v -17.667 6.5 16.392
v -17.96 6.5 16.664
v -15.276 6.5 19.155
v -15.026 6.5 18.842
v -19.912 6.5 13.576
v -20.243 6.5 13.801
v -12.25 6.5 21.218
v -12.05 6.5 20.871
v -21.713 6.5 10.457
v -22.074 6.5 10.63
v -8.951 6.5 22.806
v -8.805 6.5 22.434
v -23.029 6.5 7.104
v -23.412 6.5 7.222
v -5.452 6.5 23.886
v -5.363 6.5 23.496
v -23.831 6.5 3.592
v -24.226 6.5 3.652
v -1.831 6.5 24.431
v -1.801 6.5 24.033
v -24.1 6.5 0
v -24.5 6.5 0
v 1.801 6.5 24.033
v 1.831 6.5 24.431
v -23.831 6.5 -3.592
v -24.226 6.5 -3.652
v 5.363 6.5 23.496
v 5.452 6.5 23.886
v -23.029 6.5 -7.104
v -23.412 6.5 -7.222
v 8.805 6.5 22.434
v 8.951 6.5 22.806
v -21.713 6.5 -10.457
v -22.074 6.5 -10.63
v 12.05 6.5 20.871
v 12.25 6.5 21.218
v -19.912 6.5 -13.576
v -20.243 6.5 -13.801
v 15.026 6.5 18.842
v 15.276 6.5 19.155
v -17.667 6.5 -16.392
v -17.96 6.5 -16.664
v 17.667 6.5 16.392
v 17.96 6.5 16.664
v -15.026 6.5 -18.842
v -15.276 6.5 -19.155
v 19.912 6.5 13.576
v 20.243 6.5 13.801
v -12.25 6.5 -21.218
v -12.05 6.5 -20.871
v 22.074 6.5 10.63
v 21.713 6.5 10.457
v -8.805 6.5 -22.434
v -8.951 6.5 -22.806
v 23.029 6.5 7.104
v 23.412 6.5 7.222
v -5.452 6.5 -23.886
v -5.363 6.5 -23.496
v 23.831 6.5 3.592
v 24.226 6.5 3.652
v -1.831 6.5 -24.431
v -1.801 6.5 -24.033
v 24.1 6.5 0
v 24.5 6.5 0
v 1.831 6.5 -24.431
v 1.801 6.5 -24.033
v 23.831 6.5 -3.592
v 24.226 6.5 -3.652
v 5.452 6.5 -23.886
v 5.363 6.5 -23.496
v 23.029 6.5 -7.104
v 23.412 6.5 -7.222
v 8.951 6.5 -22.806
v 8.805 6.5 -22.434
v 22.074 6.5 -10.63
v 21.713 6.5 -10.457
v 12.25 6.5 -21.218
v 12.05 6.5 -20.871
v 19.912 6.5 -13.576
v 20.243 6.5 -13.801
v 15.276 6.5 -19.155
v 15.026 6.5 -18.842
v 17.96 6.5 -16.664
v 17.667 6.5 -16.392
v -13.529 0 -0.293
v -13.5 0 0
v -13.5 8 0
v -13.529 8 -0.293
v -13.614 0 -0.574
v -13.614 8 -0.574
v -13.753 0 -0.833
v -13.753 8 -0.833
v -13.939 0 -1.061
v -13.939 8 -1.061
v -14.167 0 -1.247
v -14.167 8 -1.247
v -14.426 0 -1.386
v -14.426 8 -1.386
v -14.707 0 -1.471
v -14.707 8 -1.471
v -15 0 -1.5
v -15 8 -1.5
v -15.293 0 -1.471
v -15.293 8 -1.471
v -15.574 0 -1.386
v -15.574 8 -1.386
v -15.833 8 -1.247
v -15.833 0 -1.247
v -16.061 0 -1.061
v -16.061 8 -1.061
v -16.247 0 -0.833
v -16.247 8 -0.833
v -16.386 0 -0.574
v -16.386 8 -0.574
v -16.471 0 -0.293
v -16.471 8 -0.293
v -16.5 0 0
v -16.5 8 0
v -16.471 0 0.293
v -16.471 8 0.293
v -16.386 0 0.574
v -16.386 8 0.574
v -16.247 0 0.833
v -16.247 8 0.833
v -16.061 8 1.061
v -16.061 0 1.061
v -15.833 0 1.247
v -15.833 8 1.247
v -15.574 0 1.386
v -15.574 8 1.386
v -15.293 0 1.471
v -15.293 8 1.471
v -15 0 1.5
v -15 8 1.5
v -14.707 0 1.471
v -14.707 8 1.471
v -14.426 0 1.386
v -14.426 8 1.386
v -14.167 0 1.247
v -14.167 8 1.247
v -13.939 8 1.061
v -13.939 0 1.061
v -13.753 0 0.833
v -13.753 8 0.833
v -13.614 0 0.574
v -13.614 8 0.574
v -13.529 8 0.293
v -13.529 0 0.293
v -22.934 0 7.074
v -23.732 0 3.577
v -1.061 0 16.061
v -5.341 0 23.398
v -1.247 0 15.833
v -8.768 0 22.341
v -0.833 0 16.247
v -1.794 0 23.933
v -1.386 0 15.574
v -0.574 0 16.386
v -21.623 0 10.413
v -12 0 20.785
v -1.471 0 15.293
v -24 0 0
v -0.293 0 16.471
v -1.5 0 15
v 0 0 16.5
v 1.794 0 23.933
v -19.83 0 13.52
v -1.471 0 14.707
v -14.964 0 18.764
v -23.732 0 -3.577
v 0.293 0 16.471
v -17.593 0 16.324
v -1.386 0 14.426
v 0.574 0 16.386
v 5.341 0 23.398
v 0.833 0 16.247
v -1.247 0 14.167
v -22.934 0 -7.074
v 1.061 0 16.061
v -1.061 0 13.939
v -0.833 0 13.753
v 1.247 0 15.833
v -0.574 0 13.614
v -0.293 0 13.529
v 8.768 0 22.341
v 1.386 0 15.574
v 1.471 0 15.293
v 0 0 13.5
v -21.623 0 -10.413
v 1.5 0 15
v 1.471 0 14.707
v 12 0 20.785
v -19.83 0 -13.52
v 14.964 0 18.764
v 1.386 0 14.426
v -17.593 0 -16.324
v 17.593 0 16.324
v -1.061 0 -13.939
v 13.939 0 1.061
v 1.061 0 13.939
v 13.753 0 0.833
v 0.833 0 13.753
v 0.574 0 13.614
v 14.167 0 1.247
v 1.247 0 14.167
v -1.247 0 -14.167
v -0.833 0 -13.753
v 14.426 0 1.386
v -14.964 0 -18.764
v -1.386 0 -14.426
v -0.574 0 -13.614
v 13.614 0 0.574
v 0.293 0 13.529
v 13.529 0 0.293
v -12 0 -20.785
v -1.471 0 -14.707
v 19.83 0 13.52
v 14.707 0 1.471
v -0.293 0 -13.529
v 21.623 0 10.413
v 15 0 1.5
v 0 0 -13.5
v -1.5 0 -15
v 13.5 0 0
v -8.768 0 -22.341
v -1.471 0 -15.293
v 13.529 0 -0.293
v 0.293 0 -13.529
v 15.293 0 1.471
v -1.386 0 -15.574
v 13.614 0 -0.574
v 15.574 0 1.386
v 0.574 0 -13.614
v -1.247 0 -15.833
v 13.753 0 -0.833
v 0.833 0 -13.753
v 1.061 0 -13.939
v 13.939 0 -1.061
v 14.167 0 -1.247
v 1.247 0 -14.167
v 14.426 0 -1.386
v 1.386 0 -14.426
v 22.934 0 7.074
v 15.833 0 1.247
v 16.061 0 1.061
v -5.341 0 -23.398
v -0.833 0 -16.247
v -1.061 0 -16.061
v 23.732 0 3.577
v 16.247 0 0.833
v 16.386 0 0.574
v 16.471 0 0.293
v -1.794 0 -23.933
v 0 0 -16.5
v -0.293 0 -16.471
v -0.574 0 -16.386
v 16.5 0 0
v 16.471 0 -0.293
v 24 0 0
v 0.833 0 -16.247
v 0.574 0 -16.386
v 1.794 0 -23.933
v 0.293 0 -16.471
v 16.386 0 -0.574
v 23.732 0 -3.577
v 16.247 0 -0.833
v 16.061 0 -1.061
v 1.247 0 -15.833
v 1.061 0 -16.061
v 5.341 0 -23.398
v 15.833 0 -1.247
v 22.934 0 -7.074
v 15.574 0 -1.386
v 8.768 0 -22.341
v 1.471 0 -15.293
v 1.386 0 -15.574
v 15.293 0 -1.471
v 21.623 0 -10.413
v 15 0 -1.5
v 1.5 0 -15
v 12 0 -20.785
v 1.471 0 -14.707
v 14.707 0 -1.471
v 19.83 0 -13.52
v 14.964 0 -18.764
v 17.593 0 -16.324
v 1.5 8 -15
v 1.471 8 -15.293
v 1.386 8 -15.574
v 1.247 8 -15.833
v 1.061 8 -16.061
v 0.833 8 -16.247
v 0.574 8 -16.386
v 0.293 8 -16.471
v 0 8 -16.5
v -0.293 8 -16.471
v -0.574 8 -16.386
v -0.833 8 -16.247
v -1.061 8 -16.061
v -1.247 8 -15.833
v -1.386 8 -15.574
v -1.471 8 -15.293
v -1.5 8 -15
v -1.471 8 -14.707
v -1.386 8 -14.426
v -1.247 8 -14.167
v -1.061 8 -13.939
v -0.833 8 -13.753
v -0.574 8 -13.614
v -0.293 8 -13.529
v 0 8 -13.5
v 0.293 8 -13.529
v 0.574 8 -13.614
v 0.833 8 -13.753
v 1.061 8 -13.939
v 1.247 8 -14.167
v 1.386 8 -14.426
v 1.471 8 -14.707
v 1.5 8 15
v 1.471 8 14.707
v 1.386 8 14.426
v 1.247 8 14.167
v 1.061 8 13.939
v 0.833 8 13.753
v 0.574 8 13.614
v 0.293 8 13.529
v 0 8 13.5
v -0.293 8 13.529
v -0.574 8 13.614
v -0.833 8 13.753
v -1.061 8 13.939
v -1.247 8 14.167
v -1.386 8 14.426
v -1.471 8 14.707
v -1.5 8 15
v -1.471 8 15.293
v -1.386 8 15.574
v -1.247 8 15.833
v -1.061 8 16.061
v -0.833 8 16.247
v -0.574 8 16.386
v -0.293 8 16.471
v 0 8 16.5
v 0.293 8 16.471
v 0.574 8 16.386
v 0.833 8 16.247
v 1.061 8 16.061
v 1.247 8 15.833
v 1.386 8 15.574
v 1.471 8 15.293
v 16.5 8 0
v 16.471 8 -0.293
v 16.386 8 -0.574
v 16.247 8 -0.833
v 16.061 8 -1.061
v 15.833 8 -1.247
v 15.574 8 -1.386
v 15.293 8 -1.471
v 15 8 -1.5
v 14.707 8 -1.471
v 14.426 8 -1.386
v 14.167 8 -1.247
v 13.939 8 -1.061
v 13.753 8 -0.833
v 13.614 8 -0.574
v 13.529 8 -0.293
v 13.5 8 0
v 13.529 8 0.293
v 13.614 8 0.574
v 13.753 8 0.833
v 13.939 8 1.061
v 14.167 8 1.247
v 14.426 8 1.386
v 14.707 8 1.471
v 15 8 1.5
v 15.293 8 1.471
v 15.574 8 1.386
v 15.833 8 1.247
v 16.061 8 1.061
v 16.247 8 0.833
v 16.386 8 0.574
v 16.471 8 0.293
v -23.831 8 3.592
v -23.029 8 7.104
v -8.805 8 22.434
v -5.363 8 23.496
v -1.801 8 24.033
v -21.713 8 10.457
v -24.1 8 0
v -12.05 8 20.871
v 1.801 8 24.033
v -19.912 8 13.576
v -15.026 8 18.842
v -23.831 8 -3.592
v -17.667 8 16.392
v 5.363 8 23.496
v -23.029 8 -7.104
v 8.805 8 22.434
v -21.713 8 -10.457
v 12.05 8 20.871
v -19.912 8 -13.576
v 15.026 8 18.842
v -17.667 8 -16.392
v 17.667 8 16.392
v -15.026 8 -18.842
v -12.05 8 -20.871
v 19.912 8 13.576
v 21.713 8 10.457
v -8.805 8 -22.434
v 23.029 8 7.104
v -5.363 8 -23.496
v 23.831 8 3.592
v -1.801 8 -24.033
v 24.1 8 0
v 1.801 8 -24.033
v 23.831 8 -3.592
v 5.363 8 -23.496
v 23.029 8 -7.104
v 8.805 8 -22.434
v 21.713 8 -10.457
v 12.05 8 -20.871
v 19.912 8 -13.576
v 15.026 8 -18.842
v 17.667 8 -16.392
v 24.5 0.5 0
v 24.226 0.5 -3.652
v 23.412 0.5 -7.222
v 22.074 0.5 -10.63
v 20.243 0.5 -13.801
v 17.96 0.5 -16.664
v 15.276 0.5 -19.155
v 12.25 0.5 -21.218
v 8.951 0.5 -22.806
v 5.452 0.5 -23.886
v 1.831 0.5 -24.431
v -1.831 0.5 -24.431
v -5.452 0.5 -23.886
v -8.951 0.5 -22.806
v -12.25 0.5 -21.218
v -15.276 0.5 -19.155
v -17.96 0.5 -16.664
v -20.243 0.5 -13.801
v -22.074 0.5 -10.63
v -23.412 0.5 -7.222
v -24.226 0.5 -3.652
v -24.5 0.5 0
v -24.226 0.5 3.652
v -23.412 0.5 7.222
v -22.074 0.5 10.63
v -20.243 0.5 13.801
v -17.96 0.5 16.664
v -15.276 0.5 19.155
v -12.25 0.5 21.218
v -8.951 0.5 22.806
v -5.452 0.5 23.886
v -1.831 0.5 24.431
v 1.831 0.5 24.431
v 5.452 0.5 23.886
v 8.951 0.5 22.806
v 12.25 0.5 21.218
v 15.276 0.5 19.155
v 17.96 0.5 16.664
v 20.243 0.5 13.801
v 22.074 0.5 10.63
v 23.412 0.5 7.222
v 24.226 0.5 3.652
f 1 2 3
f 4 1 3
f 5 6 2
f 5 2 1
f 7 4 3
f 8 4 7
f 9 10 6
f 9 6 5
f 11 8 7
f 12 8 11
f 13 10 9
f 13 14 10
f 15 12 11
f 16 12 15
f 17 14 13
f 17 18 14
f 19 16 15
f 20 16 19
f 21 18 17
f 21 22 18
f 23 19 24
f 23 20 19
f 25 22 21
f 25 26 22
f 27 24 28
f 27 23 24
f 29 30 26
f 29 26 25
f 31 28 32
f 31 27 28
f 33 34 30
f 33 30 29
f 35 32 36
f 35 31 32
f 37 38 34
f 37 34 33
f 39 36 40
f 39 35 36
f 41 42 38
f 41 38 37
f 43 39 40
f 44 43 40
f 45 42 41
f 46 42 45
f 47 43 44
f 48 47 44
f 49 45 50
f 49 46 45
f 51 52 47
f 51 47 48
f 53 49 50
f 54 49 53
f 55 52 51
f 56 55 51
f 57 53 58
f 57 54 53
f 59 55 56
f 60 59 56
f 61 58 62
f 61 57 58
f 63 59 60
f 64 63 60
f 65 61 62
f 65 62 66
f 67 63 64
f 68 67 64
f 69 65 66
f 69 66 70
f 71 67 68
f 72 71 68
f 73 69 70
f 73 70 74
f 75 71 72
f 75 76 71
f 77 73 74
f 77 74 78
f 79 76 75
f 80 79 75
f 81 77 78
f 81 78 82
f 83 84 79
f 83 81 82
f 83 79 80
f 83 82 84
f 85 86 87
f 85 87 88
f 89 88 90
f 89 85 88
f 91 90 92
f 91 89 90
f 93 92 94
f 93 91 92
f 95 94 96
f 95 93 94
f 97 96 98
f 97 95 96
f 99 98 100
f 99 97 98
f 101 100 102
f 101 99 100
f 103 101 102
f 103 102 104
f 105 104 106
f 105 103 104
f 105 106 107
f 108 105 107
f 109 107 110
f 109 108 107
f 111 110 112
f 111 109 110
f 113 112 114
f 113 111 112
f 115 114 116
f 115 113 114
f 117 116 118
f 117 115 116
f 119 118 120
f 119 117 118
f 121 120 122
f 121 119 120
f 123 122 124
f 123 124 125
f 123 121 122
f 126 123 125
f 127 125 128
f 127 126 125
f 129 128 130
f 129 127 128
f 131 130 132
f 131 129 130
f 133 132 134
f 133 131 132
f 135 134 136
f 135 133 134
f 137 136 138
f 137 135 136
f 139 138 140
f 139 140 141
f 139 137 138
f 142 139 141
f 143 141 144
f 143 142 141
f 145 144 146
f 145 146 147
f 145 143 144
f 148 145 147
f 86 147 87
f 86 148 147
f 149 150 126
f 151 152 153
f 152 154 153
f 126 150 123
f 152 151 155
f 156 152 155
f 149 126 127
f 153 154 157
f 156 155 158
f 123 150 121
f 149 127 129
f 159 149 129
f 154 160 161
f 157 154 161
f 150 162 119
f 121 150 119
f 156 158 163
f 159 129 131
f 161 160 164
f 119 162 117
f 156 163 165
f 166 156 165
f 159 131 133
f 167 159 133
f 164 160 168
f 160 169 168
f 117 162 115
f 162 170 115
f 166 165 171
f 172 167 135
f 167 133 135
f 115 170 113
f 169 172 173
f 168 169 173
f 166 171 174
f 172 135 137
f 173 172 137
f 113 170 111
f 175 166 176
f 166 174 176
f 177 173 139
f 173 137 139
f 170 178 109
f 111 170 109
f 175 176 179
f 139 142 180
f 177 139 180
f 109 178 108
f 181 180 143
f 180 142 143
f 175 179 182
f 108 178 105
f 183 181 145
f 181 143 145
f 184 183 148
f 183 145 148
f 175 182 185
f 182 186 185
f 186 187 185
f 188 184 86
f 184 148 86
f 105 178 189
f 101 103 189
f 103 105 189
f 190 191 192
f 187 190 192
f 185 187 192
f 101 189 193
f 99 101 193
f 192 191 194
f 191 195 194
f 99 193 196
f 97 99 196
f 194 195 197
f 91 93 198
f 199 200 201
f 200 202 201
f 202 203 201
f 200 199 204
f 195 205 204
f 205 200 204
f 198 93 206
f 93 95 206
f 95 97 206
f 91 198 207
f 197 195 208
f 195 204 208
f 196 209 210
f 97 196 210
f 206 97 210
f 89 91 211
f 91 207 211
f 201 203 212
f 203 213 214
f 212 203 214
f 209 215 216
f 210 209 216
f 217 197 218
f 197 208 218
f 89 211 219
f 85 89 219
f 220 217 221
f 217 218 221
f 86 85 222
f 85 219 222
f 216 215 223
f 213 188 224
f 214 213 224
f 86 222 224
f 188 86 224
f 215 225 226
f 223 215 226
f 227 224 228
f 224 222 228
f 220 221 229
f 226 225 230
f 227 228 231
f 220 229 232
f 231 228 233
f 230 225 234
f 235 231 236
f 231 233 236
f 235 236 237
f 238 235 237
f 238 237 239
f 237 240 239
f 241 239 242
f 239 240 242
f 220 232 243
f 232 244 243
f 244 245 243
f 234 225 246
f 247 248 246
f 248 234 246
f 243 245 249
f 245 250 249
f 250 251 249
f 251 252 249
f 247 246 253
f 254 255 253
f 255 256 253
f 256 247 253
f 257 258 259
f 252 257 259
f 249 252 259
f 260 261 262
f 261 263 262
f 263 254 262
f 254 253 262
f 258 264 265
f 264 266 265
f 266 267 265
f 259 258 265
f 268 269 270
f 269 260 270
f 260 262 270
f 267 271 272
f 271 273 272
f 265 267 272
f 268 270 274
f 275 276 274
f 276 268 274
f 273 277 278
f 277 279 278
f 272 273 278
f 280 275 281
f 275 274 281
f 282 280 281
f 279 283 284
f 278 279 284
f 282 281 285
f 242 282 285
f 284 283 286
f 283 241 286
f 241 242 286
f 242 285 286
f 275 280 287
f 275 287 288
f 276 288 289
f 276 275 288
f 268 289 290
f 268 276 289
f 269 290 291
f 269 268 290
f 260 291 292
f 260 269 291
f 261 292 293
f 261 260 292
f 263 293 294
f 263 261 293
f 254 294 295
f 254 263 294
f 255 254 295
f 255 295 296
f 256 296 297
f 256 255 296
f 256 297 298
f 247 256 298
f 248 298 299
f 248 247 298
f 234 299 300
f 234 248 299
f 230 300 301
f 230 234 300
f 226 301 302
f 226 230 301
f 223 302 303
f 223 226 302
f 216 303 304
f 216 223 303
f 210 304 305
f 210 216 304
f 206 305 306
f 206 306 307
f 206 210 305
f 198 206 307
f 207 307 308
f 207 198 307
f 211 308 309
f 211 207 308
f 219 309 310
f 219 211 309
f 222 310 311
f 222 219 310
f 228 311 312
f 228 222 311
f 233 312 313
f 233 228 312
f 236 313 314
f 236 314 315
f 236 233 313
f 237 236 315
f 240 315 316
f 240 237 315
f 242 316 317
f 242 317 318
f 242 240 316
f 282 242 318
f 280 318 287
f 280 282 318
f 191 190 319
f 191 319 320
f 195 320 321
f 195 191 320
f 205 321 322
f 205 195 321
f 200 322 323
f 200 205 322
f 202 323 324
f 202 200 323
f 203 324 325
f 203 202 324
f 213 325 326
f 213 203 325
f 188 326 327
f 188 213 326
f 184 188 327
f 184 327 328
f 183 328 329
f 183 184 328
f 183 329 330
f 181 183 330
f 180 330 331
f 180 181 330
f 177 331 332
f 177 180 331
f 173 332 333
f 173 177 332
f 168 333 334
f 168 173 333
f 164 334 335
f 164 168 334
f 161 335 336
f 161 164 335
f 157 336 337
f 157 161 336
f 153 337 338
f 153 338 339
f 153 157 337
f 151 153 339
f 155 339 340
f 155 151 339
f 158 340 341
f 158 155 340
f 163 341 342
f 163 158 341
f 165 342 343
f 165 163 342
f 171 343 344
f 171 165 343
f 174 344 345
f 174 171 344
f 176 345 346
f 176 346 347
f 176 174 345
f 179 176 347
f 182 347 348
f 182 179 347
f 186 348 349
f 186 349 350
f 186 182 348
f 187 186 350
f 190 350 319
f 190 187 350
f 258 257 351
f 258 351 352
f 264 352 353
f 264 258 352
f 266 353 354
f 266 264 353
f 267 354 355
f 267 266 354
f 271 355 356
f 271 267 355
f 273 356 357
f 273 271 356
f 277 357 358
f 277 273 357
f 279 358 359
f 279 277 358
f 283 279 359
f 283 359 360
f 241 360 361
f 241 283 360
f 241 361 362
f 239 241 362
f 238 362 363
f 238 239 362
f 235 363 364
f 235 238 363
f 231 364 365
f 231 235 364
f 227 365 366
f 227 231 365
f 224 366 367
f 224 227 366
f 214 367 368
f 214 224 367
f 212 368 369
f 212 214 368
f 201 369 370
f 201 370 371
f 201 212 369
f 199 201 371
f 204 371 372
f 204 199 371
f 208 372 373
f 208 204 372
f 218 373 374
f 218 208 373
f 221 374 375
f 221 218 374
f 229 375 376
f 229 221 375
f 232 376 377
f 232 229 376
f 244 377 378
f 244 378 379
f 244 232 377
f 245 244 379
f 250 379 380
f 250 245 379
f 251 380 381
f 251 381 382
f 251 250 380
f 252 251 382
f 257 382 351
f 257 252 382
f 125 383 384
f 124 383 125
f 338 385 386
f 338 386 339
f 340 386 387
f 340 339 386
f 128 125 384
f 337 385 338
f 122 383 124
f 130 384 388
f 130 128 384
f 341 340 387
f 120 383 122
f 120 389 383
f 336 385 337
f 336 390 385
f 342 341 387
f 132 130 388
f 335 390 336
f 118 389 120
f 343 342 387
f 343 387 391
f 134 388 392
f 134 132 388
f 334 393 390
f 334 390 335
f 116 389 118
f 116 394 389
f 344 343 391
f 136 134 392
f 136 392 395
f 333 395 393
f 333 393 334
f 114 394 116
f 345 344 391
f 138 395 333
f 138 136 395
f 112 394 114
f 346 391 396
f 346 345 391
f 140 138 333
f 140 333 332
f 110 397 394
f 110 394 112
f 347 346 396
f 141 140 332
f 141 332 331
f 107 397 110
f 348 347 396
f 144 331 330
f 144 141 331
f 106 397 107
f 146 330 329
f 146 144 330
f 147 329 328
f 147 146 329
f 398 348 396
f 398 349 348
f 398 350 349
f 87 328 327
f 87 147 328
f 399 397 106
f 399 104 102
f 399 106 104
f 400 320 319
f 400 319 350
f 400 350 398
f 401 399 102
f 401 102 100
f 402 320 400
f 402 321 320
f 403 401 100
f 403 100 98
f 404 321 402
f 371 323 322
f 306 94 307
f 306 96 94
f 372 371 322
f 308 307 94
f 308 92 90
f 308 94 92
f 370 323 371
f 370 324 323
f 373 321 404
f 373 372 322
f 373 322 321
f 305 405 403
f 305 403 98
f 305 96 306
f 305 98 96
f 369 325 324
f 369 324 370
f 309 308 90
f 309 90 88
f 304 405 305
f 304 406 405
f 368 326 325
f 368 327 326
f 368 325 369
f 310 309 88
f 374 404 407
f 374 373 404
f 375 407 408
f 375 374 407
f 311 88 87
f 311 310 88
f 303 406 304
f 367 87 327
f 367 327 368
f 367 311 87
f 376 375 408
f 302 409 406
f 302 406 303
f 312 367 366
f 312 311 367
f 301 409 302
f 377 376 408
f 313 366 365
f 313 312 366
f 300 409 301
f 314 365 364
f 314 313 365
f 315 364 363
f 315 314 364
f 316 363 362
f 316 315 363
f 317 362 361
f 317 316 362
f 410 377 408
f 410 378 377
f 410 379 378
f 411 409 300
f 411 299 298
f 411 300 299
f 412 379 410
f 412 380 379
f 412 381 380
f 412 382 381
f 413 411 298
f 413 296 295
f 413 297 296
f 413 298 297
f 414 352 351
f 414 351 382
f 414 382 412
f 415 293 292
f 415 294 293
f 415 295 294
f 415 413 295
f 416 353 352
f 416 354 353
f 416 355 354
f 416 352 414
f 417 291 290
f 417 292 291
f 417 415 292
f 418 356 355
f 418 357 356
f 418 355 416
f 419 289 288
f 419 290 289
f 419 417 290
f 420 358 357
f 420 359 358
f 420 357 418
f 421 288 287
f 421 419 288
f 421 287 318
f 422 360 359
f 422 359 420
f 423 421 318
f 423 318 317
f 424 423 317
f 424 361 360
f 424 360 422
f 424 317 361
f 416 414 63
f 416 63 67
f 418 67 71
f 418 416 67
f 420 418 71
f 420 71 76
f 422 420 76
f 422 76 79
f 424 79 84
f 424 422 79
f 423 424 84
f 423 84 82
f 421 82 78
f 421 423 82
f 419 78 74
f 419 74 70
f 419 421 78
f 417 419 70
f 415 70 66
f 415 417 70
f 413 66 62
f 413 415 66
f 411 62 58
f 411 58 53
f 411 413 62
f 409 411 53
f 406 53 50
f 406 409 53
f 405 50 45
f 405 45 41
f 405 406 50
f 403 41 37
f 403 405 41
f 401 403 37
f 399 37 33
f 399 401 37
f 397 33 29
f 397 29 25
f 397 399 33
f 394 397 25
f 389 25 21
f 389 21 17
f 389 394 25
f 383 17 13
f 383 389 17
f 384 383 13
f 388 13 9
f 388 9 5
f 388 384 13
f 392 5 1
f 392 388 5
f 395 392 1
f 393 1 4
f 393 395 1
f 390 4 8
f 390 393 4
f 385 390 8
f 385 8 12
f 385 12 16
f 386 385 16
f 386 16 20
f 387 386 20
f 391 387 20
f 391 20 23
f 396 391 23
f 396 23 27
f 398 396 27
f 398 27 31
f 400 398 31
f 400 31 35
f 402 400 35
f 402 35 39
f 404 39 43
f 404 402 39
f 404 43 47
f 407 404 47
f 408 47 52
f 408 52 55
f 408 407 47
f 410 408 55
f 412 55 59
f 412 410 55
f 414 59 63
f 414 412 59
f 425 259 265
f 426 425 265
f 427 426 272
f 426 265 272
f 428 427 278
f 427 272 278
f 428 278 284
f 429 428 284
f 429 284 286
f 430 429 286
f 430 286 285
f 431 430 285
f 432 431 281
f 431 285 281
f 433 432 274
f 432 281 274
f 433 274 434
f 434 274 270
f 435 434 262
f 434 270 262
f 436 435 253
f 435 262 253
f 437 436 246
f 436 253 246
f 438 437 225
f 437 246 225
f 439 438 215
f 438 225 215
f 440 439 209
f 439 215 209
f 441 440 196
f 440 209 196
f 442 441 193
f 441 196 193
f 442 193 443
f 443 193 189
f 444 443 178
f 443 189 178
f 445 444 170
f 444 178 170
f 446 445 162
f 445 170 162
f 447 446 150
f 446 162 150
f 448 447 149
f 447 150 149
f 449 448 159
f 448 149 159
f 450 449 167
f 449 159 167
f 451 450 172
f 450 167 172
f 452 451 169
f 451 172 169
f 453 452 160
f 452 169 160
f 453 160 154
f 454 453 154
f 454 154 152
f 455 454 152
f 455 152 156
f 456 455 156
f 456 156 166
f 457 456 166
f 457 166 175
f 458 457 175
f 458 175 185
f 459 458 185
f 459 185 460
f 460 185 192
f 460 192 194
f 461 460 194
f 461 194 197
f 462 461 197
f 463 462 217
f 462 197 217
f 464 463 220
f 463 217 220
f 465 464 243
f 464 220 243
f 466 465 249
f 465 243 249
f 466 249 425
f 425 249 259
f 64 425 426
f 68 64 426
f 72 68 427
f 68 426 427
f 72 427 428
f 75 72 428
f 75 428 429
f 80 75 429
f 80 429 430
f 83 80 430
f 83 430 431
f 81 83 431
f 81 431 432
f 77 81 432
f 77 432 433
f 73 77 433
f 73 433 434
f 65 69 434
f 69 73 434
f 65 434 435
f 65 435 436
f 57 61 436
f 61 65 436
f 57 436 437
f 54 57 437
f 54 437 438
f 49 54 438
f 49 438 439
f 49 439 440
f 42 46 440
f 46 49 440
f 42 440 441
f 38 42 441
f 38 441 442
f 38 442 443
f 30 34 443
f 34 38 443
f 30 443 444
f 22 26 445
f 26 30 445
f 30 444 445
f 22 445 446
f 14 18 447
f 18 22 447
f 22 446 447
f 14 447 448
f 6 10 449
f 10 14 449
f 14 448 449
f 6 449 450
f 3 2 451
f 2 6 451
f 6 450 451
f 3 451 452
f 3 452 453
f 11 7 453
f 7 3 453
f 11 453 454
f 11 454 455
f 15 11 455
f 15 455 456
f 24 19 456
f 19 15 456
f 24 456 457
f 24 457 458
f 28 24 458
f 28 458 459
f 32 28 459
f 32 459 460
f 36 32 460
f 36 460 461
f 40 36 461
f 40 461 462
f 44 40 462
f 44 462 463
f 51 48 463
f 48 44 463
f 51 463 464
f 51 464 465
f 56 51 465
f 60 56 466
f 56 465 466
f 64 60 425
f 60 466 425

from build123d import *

# Parameters (mm, degrees)
ESQUISSE1_R             = 24.5
ESQUISSE1_R_2           = 1.5
BOSS_EXTRU_1_DEPTH      = 8
ESQUISSE2_OUTSIDE_W     = 64.952
ESQUISSE2_OUTSIDE_H     = 64.952
ESQUISSE2_OUTSIDE_R     = 24.1
ENL_V_MAT_EXTRU_1_DEPTH = 1.5
CHANFREIN1_SIZE         = 0.5


with BuildPart() as part:
    # Esquisse1 → Boss.-Extru.1 (new body)
    with BuildSketch(Plane(origin=(0, 0, 0), x_dir=(1, 0, 0), z_dir=(0, 1, 0))):
        Circle(ESQUISSE1_R)
        with Locations((0, 15)):
            Circle(ESQUISSE1_R_2, mode=Mode.SUBTRACT)
        with Locations((15, 0)):
            Circle(ESQUISSE1_R_2, mode=Mode.SUBTRACT)
        with Locations((0, -15)):
            Circle(ESQUISSE1_R_2, mode=Mode.SUBTRACT)
        with Locations((-15, 0)):
            Circle(ESQUISSE1_R_2, mode=Mode.SUBTRACT)
    extrude(amount=BOSS_EXTRU_1_DEPTH)

    # Esquisse2 outside → Enlèv. mat.-Extru.1 (cut)
    with BuildSketch(Plane(origin=(0, 8, 0), x_dir=(1, 0, 0), z_dir=(0, 1, 0))):
        Rectangle(ESQUISSE2_OUTSIDE_W, ESQUISSE2_OUTSIDE_H)
        Circle(ESQUISSE2_OUTSIDE_R, mode=Mode.SUBTRACT)
    extrude(amount=-ENL_V_MAT_EXTRU_1_DEPTH, mode=Mode.SUBTRACT)

    # Chanfrein1
    chanfrein1_edges = [part.edges().sort_by_distance(p)[0] for p in [
        (-24.5, 0, 0),
    ]]
    chamfer(chanfrein1_edges, length=CHANFREIN1_SIZE)


solid = part.part
